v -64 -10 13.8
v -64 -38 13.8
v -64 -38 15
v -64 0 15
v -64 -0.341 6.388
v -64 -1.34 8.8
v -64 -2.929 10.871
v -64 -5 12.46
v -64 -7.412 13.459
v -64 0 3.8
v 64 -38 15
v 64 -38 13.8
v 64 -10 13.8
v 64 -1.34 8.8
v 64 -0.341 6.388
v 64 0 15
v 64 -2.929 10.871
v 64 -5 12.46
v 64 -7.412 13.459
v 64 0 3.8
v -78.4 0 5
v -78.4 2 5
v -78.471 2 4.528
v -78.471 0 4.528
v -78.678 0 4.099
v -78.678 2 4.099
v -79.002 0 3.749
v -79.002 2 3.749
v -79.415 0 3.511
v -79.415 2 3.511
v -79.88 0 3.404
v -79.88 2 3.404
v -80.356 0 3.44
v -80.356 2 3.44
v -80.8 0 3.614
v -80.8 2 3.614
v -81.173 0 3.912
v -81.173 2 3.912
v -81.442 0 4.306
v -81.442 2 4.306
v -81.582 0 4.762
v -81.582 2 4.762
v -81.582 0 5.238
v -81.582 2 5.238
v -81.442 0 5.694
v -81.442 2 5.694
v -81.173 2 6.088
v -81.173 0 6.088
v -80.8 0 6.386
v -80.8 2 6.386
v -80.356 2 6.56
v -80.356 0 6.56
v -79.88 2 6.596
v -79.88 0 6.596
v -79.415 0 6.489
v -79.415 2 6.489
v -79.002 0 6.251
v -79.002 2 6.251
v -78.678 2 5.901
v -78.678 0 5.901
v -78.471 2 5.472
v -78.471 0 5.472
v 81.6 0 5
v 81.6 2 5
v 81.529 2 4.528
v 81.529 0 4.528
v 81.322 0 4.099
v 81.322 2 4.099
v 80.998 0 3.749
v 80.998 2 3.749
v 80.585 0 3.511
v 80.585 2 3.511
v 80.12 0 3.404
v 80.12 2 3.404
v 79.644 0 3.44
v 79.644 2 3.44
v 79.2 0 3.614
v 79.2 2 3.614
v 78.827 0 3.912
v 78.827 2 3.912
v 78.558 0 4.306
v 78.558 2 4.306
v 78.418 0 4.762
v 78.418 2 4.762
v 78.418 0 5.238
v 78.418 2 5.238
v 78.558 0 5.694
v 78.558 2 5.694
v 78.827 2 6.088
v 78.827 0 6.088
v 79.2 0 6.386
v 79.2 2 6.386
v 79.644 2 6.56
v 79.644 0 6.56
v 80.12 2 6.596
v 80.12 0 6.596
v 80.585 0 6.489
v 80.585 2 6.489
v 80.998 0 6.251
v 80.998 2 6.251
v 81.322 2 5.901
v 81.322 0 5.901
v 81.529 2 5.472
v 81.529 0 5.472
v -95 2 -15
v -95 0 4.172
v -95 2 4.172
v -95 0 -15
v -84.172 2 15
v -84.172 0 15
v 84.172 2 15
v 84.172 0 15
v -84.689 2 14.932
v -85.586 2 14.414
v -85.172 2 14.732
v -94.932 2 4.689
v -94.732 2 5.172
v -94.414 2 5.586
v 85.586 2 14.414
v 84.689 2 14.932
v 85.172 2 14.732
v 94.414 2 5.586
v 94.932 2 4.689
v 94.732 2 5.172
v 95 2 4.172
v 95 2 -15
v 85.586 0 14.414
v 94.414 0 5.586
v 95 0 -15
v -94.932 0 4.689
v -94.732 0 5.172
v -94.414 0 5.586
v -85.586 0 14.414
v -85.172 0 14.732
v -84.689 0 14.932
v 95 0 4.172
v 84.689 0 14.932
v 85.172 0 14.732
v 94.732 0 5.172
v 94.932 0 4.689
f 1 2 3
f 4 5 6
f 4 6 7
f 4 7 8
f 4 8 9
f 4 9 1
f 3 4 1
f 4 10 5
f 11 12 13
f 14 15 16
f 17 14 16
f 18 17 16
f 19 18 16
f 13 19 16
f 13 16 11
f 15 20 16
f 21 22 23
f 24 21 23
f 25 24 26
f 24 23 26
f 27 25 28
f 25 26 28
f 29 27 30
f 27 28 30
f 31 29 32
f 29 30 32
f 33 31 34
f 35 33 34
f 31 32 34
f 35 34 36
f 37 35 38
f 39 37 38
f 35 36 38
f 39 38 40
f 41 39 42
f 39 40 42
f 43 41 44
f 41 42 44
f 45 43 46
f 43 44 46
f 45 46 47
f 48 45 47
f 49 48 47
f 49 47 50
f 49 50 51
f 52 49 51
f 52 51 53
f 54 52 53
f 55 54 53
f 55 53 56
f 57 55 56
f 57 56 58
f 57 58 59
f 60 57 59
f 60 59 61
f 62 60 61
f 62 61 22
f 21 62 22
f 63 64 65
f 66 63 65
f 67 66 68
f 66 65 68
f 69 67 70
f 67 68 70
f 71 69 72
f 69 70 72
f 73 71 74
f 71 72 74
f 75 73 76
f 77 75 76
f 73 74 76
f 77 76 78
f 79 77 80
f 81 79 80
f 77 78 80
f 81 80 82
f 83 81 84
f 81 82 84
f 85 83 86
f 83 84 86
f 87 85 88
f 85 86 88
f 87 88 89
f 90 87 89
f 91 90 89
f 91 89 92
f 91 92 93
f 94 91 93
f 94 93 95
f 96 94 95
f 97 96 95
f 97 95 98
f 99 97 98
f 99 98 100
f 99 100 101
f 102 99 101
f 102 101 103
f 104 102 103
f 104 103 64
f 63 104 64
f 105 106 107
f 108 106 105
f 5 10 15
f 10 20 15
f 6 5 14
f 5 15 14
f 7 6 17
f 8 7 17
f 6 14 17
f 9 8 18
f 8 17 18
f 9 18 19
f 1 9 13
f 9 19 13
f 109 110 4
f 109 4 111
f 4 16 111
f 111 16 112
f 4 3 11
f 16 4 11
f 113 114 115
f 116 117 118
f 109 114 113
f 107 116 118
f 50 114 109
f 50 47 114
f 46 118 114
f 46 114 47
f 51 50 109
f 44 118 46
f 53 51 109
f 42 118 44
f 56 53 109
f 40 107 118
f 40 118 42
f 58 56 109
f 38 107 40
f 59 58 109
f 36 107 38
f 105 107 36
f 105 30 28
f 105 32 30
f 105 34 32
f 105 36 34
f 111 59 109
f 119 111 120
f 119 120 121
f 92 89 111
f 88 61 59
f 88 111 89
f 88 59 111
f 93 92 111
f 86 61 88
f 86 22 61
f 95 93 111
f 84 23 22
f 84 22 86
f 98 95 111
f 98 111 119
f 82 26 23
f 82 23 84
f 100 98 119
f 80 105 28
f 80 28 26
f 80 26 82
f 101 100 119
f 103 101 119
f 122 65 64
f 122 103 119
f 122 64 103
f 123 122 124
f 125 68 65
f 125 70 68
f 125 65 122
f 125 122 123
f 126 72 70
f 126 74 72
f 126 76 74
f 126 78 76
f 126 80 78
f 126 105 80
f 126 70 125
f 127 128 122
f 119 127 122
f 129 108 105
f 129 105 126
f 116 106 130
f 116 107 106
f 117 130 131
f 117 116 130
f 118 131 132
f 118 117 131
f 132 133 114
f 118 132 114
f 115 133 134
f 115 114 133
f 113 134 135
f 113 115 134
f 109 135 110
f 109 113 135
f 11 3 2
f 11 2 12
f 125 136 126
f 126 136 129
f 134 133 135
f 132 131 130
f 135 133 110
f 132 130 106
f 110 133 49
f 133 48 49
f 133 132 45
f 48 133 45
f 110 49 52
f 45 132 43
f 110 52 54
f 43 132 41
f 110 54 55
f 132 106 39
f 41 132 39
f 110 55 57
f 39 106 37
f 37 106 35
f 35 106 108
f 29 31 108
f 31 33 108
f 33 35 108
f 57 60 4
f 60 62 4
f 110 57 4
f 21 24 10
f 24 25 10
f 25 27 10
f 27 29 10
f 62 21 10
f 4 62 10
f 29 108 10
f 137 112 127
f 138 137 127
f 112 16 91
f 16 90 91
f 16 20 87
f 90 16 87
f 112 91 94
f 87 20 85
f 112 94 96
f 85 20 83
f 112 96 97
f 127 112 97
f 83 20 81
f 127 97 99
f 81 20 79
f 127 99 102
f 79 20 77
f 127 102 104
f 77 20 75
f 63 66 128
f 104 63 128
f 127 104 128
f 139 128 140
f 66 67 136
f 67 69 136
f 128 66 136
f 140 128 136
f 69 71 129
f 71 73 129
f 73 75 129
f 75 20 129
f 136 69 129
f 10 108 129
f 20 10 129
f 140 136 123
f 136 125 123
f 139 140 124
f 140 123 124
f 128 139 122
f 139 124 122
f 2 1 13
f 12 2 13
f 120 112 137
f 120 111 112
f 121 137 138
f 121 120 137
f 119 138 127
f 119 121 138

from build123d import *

# Parameters (mm, degrees)
ESQUISSE2_W             = 190
ESQUISSE2_H             = 30
BOSS_EXTRU_1_DEPTH      = 2
ESQUISSE3_W             = 128
ESQUISSE3_H             = 1.2
BOSS_EXTRU_2_DEPTH      = 38
CHANFREIN1_SIZE         = 10
CONG_1_R                = 2
ESQUISSE4_R             = 1.6
ENL_V_MAT_EXTRU_1_DEPTH = 41
CONG_2_R                = 10


with BuildPart() as part:
    # Esquisse2 → Boss.-Extru.1 (new body)
    with BuildSketch(Plane(origin=(0, 0, 0), x_dir=(1, 0, 0), z_dir=(0, 1, 0))):
        Rectangle(ESQUISSE2_W, ESQUISSE2_H)
    extrude(amount=BOSS_EXTRU_1_DEPTH)

    # Esquisse3 → Boss.-Extru.2 (add)
    with BuildSketch(Plane.XZ):
        with Locations((0, 14.4)):
            Rectangle(ESQUISSE3_W, ESQUISSE3_H)
    extrude(amount=BOSS_EXTRU_2_DEPTH)

    # Chanfrein1
    chanfrein1_edges = [part.edges().sort_by_distance(p)[0] for p in [
        (95, 1, 15),
        (-95, 1, 15),
    ]]
    chamfer(chanfrein1_edges, length=CHANFREIN1_SIZE)

    # Congé1
    cong_1_edges = [part.edges().sort_by_distance(p)[0] for p in [
        (95, 1, 5),
        (-85, 1, 15),
        (85, 1, 15),
        (-95, 1, 5),
    ]]
    fillet(cong_1_edges, radius=CONG_1_R)

    # Esquisse4 → Enlèv. mat.-Extru.1 (cut, through all)
    with BuildSketch(Plane(origin=(0, 2, 0), x_dir=(1, 0, 0), z_dir=(0, 1, 0))):
        with Locations((-80, -5)):
            Circle(ESQUISSE4_R)
        with Locations((80, -5)):
            Circle(ESQUISSE4_R)
    extrude(amount=-ENL_V_MAT_EXTRU_1_DEPTH, mode=Mode.SUBTRACT)

    # Congé2
    cong_2_edges = [part.edges().sort_by_distance(p)[0] for p in [
        (0, 0, 13.8),
    ]]
    fillet(cong_2_edges, radius=CONG_2_R)


solid = part.part
